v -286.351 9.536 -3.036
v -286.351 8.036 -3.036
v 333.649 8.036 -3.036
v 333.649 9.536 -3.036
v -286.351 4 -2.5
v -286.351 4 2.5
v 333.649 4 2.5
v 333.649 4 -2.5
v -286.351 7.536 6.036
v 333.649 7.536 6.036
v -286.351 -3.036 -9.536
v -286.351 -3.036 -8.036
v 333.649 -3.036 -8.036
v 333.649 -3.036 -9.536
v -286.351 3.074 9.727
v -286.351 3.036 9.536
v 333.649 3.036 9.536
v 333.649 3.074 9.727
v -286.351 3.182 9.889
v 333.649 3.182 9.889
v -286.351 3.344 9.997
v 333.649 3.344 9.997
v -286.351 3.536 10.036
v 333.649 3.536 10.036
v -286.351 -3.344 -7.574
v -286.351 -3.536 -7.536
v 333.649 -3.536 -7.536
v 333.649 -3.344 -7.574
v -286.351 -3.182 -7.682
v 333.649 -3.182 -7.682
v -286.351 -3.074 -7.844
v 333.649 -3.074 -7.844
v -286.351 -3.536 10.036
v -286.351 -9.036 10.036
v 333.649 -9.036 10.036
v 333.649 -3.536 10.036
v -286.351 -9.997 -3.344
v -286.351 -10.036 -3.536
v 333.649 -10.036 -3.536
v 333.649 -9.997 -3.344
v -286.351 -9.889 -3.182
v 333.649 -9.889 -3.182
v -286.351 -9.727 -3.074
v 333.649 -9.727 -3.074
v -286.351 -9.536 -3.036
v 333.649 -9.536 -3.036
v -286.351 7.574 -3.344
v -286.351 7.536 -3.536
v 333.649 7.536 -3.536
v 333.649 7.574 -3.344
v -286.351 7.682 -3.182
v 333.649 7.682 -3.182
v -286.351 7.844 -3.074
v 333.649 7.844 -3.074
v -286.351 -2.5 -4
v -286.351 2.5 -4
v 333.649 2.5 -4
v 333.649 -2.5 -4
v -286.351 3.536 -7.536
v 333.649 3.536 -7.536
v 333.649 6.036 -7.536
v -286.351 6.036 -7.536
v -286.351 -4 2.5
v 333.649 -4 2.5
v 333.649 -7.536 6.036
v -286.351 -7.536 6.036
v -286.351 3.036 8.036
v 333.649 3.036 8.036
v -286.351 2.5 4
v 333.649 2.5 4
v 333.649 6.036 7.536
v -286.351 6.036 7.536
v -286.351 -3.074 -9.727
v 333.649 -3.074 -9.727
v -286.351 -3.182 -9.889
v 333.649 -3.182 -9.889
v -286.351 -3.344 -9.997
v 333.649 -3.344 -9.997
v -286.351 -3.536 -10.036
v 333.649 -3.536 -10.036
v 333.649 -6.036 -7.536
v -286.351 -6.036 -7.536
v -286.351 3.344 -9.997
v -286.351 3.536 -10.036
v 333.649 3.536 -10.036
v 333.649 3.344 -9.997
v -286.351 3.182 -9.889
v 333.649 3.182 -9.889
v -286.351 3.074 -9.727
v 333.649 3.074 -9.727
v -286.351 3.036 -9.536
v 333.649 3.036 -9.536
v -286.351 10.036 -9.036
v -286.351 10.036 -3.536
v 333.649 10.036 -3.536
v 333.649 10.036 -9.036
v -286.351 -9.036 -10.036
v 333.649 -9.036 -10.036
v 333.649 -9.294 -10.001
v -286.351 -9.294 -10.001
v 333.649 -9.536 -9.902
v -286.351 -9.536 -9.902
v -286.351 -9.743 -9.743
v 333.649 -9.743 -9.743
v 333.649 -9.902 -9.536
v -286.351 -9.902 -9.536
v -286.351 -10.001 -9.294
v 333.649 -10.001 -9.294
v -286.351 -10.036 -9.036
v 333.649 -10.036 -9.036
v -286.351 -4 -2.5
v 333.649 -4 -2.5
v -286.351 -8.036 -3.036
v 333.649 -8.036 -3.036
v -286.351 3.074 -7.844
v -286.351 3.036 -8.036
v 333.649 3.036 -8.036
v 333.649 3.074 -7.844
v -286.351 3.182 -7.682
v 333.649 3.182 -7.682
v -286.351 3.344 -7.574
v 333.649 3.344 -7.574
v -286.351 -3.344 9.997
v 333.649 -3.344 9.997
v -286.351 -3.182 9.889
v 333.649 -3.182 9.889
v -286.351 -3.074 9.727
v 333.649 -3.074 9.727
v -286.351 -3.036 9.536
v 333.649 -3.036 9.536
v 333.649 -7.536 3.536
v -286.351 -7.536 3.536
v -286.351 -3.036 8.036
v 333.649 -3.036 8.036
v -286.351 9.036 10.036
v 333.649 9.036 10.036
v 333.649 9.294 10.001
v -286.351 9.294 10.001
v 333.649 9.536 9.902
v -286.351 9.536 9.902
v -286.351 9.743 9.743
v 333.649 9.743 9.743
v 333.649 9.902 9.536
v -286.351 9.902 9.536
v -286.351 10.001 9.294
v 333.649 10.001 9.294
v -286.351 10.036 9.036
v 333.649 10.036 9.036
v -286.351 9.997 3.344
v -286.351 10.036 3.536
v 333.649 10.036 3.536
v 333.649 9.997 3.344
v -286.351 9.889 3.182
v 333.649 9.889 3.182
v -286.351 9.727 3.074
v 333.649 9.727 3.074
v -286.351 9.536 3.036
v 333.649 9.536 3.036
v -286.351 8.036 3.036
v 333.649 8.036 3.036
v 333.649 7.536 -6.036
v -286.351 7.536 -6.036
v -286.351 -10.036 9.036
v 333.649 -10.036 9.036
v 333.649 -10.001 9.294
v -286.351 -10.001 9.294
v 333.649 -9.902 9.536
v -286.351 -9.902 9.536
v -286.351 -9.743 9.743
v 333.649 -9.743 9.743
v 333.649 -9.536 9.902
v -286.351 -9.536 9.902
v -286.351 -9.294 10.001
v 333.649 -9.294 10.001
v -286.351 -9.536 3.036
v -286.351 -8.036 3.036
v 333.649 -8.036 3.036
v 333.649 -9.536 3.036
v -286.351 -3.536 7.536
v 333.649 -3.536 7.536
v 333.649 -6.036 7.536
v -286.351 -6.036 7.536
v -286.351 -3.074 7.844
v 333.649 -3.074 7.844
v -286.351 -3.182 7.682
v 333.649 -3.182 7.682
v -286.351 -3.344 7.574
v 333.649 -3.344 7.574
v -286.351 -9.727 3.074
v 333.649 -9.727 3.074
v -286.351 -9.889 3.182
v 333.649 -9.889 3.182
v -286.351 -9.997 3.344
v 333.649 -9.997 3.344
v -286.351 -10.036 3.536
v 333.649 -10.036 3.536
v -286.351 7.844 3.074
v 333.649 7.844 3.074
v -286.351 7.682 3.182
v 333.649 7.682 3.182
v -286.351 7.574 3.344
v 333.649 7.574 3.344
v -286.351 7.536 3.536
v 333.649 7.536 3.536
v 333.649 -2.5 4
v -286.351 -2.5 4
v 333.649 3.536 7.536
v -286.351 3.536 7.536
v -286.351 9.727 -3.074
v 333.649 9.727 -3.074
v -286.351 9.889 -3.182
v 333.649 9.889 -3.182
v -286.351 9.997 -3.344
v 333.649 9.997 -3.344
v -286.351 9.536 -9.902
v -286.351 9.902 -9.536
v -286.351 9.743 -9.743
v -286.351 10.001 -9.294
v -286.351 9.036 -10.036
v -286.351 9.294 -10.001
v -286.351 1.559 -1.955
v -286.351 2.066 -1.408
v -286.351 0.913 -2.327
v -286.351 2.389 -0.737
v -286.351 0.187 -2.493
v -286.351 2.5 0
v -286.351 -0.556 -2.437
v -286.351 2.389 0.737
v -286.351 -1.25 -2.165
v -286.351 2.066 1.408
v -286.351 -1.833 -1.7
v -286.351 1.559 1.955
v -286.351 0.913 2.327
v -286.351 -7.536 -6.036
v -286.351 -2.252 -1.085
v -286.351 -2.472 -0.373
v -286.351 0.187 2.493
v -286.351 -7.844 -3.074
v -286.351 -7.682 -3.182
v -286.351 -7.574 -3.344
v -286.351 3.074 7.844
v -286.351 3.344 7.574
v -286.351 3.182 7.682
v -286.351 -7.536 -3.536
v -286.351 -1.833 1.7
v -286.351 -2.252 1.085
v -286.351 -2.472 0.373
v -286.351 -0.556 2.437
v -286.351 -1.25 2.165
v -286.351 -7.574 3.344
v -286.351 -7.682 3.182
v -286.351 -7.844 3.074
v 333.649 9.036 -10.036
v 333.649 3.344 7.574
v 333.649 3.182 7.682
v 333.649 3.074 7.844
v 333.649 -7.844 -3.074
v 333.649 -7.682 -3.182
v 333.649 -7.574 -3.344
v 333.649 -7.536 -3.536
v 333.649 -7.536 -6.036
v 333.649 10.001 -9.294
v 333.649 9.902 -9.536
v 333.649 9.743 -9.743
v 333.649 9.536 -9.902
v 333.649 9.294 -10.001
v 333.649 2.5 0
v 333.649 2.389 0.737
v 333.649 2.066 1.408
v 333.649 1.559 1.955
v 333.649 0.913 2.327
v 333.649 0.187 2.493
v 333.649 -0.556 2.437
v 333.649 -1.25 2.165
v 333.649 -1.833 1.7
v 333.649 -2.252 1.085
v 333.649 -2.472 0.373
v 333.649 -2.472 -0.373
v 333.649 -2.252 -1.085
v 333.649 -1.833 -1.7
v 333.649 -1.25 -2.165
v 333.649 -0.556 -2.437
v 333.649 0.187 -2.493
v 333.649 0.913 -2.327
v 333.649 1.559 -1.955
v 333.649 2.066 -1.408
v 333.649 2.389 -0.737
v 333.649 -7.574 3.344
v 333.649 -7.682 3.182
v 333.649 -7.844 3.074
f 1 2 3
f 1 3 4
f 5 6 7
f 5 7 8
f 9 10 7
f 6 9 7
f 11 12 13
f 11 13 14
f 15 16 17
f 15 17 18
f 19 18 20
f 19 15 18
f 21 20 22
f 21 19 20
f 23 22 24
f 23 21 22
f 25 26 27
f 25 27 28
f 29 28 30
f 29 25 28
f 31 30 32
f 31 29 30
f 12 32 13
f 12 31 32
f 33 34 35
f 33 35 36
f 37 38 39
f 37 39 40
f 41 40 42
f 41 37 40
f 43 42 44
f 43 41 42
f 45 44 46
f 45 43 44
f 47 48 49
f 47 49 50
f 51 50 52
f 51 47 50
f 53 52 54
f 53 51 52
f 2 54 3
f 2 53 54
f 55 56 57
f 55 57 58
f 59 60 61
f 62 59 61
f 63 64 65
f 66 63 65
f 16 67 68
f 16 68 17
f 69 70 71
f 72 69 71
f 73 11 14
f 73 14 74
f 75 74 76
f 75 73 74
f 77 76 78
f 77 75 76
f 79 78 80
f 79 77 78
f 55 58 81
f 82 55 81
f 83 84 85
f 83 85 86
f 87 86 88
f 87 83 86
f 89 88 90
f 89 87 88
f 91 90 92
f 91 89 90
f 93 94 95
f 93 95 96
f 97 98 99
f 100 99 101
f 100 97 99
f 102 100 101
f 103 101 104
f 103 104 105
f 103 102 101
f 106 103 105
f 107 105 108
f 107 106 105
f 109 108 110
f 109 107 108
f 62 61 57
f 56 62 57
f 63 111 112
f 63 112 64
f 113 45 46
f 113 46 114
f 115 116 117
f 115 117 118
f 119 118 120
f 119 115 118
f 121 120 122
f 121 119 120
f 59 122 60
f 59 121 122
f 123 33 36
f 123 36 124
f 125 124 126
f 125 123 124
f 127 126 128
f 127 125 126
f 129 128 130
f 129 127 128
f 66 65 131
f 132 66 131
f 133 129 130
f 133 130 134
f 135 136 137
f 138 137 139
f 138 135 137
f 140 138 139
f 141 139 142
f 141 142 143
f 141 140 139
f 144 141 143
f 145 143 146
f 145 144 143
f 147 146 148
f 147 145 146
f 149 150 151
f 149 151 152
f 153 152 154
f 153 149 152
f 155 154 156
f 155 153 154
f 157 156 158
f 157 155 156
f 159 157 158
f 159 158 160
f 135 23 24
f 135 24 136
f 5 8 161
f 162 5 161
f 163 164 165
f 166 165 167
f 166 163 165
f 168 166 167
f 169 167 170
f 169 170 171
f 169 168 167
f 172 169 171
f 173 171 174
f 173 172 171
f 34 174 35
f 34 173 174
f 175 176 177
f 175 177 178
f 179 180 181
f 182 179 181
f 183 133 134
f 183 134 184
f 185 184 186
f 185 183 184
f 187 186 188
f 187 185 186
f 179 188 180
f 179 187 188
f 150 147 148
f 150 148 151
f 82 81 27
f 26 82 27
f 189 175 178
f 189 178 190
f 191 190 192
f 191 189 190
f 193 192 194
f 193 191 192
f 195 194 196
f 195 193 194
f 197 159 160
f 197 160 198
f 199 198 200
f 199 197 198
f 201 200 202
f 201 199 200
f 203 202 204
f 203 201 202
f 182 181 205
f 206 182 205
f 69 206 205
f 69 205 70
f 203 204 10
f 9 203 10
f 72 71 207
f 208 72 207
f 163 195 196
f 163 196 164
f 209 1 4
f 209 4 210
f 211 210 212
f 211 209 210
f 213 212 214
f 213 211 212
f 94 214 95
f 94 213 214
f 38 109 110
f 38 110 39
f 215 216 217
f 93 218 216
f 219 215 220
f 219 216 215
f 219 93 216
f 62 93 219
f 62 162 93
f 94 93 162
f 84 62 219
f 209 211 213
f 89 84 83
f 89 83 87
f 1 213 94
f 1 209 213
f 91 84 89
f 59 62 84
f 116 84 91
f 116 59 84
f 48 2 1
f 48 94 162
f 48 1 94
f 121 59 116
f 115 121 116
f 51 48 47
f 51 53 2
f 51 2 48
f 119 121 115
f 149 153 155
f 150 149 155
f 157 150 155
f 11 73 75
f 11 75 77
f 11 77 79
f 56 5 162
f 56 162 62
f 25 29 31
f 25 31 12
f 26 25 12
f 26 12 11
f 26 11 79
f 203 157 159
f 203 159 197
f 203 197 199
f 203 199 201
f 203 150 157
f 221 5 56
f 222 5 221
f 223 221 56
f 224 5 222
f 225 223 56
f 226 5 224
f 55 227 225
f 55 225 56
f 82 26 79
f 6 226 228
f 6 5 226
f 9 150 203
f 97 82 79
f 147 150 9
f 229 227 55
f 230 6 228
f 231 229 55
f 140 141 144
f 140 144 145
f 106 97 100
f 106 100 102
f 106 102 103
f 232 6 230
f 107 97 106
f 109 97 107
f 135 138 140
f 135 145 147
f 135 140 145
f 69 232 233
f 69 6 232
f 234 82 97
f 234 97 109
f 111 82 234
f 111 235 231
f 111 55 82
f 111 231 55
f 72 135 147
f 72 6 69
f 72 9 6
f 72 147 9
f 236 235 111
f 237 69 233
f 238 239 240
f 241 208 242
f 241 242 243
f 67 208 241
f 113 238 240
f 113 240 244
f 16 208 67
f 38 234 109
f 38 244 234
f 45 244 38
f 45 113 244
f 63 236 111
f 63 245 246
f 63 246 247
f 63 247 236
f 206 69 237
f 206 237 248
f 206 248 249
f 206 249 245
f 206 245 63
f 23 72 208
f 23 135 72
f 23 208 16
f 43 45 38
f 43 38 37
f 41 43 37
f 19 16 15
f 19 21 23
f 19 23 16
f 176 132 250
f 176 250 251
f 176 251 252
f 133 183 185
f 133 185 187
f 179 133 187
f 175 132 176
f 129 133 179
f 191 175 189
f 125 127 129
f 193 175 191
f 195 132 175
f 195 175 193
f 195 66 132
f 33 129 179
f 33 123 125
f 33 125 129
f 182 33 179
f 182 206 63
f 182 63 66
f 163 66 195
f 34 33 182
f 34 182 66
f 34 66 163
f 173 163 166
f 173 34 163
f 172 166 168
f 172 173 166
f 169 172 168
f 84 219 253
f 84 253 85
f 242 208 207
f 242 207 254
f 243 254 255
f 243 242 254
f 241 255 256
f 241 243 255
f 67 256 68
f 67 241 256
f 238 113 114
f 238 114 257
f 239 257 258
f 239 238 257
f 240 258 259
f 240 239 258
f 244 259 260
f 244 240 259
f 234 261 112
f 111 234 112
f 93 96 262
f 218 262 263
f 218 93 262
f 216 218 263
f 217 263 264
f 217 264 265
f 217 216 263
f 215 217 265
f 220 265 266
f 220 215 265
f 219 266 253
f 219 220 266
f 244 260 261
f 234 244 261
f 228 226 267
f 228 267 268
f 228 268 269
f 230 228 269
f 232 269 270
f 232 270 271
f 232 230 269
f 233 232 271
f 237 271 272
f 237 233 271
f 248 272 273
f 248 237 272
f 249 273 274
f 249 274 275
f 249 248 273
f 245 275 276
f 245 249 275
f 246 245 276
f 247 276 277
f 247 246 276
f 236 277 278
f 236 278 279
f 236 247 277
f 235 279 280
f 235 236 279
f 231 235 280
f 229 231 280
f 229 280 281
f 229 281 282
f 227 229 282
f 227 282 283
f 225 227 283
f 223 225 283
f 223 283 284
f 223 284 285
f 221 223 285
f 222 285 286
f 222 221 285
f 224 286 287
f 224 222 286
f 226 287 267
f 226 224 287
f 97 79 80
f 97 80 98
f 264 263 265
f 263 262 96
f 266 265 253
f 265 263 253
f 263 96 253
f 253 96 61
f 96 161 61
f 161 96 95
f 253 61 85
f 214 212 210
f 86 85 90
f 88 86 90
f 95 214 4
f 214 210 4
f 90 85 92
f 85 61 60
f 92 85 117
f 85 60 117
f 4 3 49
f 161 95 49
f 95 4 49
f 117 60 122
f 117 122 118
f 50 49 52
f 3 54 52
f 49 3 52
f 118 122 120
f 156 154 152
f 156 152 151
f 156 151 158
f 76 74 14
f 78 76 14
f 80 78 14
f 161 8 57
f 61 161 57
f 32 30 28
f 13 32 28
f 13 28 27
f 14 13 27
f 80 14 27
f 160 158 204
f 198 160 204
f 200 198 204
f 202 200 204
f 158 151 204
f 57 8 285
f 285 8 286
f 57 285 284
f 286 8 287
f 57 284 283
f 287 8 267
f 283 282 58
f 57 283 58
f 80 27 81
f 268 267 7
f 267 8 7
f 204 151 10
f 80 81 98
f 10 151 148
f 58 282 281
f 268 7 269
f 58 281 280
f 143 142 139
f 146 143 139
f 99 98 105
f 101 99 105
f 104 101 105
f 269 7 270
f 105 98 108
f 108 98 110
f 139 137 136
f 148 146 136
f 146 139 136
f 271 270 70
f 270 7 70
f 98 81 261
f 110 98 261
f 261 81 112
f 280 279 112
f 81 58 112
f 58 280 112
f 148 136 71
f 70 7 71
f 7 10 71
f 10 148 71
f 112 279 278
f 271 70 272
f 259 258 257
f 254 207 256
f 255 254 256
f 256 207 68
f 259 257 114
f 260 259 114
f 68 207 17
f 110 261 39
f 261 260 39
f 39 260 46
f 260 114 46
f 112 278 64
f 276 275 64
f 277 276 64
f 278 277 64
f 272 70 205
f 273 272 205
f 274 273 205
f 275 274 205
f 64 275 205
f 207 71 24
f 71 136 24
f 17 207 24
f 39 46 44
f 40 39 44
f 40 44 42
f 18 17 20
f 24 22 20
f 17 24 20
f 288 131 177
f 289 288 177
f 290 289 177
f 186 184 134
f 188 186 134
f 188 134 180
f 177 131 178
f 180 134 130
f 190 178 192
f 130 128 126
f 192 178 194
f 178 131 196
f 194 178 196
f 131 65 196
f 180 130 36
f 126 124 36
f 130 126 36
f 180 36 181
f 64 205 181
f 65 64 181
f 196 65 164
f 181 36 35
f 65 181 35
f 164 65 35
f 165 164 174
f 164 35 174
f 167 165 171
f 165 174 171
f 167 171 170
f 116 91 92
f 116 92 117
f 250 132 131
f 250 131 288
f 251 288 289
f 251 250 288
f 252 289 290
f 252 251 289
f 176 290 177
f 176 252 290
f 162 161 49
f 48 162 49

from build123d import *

# Parameters (mm, degrees)
SKETCH11_R                            = 2.5
ALUMINIUM_PROF_ALUMINIUM_PROF_1_DEPTH = 620


with BuildPart() as part:
    # Sketch11 → Aluminium prof ALUMINIUM PROF(1) (new body)
    with BuildSketch(Plane.YZ.offset(-286.350515464)):
        with BuildLine():
            Line((-2.5, 4), (2.5, 4))
            Line((2.5, 4), (6.035533906, 7.535533906))
            Line((6.035533906, 7.535533906), (3.535533906, 7.535533906))
            ThreePointArc((3.535533906, 7.535533906), (3.181980515, 7.681980515), (3.035533906, 8.035533906))
            Line((3.035533906, 8.035533906), (3.035533906, 9.535533906))
            ThreePointArc((3.035533906, 9.535533906), (3.181980515, 9.889087297), (3.535533906, 10.035533906))
            Line((3.535533906, 10.035533906), (9.035533906, 10.035533906))
            ThreePointArc((9.035533906, 10.035533906), (9.742640687, 9.742640687), (10.035533906, 9.035533906))
            Line((10.035533906, 9.035533906), (10.035533906, 3.535533906))
            ThreePointArc((10.035533906, 3.535533906), (9.889087297, 3.181980515), (9.535533906, 3.035533906))
            Line((9.535533906, 3.035533906), (8.035533906, 3.035533906))
            ThreePointArc((8.035533906, 3.035533906), (7.681980515, 3.181980515), (7.535533906, 3.535533906))
            Line((7.535533906, 3.535533906), (7.535533906, 6.035533906))
            Line((7.535533906, 6.035533906), (4, 2.5))
            Line((4, 2.5), (4, -2.5))
            Line((4, -2.5), (7.535533906, -6.035533906))
            Line((7.535533906, -6.035533906), (7.535533906, -3.535533906))
            ThreePointArc((7.535533906, -3.535533906), (7.681980515, -3.181980515), (8.035533906, -3.035533906))
            Line((8.035533906, -3.035533906), (9.535533906, -3.035533906))
            ThreePointArc((9.535533906, -3.035533906), (9.889087297, -3.181980515), (10.035533906, -3.535533906))
            Line((10.035533906, -3.535533906), (10.035533906, -9.035533906))
            ThreePointArc((10.035533906, -9.035533906), (9.742640687, -9.742640687), (9.035533906, -10.035533906))
            Line((9.035533906, -10.035533906), (3.535533906, -10.035533906))
            ThreePointArc((3.535533906, -10.035533906), (3.181980515, -9.889087297), (3.035533906, -9.535533906))
            Line((3.035533906, -9.535533906), (3.035533906, -8.035533906))
            ThreePointArc((3.035533906, -8.035533906), (3.181980515, -7.681980515), (3.535533906, -7.535533906))
            Line((3.535533906, -7.535533906), (6.035533906, -7.535533906))
            Line((6.035533906, -7.535533906), (2.5, -4))
            Line((2.5, -4), (-2.5, -4))
            Line((-2.5, -4), (-6.035533906, -7.535533906))
            Line((-6.035533906, -7.535533906), (-3.535533906, -7.535533906))
            ThreePointArc((-3.535533906, -7.535533906), (-3.181980515, -7.681980515), (-3.035533906, -8.035533906))
            Line((-3.035533906, -8.035533906), (-3.035533906, -9.535533906))
            ThreePointArc((-3.035533906, -9.535533906), (-3.181980515, -9.889087297), (-3.535533906, -10.035533906))
            Line((-3.535533906, -10.035533906), (-9.035533906, -10.035533906))
            ThreePointArc((-9.035533906, -10.035533906), (-9.742640687, -9.742640687), (-10.035533906, -9.035533906))
            Line((-10.035533906, -9.035533906), (-10.035533906, -3.535533906))
            ThreePointArc((-10.035533906, -3.535533906), (-9.889087297, -3.181980515), (-9.535533906, -3.035533906))
            Line((-9.535533906, -3.035533906), (-8.035533906, -3.035533906))
            ThreePointArc((-8.035533906, -3.035533906), (-7.681980515, -3.181980515), (-7.535533906, -3.535533906))
            Line((-7.535533906, -3.535533906), (-7.535533906, -6.035533906))
            Line((-7.535533906, -6.035533906), (-4, -2.5))
            Line((-4, -2.5), (-4, 2.5))
            Line((-4, 2.5), (-7.535533906, 6.035533906))
            Line((-7.535533906, 6.035533906), (-7.535533906, 3.535533906))
            ThreePointArc((-7.535533906, 3.535533906), (-7.681980515, 3.181980515), (-8.035533906, 3.035533906))
            Line((-8.035533906, 3.035533906), (-9.535533906, 3.035533906))
            ThreePointArc((-9.535533906, 3.035533906), (-9.889087297, 3.181980515), (-10.035533906, 3.535533906))
            Line((-10.035533906, 3.535533906), (-10.035533906, 9.035533906))
            ThreePointArc((-10.035533906, 9.035533906), (-9.742640687, 9.742640687), (-9.035533906, 10.035533906))
            Line((-9.035533906, 10.035533906), (-3.535533906, 10.035533906))
            ThreePointArc((-3.535533906, 10.035533906), (-3.181980515, 9.889087297), (-3.035533906, 9.535533906))
            Line((-3.035533906, 9.535533906), (-3.035533906, 8.035533906))
            ThreePointArc((-3.035533906, 8.035533906), (-3.181980515, 7.681980515), (-3.535533906, 7.535533906))
            Line((-3.535533906, 7.535533906), (-6.035533906, 7.535533906))
            Line((-6.035533906, 7.535533906), (-2.5, 4))
        make_face()
        Circle(SKETCH11_R, mode=Mode.SUBTRACT)
    extrude(amount=ALUMINIUM_PROF_ALUMINIUM_PROF_1_DEPTH)


solid = part.part
